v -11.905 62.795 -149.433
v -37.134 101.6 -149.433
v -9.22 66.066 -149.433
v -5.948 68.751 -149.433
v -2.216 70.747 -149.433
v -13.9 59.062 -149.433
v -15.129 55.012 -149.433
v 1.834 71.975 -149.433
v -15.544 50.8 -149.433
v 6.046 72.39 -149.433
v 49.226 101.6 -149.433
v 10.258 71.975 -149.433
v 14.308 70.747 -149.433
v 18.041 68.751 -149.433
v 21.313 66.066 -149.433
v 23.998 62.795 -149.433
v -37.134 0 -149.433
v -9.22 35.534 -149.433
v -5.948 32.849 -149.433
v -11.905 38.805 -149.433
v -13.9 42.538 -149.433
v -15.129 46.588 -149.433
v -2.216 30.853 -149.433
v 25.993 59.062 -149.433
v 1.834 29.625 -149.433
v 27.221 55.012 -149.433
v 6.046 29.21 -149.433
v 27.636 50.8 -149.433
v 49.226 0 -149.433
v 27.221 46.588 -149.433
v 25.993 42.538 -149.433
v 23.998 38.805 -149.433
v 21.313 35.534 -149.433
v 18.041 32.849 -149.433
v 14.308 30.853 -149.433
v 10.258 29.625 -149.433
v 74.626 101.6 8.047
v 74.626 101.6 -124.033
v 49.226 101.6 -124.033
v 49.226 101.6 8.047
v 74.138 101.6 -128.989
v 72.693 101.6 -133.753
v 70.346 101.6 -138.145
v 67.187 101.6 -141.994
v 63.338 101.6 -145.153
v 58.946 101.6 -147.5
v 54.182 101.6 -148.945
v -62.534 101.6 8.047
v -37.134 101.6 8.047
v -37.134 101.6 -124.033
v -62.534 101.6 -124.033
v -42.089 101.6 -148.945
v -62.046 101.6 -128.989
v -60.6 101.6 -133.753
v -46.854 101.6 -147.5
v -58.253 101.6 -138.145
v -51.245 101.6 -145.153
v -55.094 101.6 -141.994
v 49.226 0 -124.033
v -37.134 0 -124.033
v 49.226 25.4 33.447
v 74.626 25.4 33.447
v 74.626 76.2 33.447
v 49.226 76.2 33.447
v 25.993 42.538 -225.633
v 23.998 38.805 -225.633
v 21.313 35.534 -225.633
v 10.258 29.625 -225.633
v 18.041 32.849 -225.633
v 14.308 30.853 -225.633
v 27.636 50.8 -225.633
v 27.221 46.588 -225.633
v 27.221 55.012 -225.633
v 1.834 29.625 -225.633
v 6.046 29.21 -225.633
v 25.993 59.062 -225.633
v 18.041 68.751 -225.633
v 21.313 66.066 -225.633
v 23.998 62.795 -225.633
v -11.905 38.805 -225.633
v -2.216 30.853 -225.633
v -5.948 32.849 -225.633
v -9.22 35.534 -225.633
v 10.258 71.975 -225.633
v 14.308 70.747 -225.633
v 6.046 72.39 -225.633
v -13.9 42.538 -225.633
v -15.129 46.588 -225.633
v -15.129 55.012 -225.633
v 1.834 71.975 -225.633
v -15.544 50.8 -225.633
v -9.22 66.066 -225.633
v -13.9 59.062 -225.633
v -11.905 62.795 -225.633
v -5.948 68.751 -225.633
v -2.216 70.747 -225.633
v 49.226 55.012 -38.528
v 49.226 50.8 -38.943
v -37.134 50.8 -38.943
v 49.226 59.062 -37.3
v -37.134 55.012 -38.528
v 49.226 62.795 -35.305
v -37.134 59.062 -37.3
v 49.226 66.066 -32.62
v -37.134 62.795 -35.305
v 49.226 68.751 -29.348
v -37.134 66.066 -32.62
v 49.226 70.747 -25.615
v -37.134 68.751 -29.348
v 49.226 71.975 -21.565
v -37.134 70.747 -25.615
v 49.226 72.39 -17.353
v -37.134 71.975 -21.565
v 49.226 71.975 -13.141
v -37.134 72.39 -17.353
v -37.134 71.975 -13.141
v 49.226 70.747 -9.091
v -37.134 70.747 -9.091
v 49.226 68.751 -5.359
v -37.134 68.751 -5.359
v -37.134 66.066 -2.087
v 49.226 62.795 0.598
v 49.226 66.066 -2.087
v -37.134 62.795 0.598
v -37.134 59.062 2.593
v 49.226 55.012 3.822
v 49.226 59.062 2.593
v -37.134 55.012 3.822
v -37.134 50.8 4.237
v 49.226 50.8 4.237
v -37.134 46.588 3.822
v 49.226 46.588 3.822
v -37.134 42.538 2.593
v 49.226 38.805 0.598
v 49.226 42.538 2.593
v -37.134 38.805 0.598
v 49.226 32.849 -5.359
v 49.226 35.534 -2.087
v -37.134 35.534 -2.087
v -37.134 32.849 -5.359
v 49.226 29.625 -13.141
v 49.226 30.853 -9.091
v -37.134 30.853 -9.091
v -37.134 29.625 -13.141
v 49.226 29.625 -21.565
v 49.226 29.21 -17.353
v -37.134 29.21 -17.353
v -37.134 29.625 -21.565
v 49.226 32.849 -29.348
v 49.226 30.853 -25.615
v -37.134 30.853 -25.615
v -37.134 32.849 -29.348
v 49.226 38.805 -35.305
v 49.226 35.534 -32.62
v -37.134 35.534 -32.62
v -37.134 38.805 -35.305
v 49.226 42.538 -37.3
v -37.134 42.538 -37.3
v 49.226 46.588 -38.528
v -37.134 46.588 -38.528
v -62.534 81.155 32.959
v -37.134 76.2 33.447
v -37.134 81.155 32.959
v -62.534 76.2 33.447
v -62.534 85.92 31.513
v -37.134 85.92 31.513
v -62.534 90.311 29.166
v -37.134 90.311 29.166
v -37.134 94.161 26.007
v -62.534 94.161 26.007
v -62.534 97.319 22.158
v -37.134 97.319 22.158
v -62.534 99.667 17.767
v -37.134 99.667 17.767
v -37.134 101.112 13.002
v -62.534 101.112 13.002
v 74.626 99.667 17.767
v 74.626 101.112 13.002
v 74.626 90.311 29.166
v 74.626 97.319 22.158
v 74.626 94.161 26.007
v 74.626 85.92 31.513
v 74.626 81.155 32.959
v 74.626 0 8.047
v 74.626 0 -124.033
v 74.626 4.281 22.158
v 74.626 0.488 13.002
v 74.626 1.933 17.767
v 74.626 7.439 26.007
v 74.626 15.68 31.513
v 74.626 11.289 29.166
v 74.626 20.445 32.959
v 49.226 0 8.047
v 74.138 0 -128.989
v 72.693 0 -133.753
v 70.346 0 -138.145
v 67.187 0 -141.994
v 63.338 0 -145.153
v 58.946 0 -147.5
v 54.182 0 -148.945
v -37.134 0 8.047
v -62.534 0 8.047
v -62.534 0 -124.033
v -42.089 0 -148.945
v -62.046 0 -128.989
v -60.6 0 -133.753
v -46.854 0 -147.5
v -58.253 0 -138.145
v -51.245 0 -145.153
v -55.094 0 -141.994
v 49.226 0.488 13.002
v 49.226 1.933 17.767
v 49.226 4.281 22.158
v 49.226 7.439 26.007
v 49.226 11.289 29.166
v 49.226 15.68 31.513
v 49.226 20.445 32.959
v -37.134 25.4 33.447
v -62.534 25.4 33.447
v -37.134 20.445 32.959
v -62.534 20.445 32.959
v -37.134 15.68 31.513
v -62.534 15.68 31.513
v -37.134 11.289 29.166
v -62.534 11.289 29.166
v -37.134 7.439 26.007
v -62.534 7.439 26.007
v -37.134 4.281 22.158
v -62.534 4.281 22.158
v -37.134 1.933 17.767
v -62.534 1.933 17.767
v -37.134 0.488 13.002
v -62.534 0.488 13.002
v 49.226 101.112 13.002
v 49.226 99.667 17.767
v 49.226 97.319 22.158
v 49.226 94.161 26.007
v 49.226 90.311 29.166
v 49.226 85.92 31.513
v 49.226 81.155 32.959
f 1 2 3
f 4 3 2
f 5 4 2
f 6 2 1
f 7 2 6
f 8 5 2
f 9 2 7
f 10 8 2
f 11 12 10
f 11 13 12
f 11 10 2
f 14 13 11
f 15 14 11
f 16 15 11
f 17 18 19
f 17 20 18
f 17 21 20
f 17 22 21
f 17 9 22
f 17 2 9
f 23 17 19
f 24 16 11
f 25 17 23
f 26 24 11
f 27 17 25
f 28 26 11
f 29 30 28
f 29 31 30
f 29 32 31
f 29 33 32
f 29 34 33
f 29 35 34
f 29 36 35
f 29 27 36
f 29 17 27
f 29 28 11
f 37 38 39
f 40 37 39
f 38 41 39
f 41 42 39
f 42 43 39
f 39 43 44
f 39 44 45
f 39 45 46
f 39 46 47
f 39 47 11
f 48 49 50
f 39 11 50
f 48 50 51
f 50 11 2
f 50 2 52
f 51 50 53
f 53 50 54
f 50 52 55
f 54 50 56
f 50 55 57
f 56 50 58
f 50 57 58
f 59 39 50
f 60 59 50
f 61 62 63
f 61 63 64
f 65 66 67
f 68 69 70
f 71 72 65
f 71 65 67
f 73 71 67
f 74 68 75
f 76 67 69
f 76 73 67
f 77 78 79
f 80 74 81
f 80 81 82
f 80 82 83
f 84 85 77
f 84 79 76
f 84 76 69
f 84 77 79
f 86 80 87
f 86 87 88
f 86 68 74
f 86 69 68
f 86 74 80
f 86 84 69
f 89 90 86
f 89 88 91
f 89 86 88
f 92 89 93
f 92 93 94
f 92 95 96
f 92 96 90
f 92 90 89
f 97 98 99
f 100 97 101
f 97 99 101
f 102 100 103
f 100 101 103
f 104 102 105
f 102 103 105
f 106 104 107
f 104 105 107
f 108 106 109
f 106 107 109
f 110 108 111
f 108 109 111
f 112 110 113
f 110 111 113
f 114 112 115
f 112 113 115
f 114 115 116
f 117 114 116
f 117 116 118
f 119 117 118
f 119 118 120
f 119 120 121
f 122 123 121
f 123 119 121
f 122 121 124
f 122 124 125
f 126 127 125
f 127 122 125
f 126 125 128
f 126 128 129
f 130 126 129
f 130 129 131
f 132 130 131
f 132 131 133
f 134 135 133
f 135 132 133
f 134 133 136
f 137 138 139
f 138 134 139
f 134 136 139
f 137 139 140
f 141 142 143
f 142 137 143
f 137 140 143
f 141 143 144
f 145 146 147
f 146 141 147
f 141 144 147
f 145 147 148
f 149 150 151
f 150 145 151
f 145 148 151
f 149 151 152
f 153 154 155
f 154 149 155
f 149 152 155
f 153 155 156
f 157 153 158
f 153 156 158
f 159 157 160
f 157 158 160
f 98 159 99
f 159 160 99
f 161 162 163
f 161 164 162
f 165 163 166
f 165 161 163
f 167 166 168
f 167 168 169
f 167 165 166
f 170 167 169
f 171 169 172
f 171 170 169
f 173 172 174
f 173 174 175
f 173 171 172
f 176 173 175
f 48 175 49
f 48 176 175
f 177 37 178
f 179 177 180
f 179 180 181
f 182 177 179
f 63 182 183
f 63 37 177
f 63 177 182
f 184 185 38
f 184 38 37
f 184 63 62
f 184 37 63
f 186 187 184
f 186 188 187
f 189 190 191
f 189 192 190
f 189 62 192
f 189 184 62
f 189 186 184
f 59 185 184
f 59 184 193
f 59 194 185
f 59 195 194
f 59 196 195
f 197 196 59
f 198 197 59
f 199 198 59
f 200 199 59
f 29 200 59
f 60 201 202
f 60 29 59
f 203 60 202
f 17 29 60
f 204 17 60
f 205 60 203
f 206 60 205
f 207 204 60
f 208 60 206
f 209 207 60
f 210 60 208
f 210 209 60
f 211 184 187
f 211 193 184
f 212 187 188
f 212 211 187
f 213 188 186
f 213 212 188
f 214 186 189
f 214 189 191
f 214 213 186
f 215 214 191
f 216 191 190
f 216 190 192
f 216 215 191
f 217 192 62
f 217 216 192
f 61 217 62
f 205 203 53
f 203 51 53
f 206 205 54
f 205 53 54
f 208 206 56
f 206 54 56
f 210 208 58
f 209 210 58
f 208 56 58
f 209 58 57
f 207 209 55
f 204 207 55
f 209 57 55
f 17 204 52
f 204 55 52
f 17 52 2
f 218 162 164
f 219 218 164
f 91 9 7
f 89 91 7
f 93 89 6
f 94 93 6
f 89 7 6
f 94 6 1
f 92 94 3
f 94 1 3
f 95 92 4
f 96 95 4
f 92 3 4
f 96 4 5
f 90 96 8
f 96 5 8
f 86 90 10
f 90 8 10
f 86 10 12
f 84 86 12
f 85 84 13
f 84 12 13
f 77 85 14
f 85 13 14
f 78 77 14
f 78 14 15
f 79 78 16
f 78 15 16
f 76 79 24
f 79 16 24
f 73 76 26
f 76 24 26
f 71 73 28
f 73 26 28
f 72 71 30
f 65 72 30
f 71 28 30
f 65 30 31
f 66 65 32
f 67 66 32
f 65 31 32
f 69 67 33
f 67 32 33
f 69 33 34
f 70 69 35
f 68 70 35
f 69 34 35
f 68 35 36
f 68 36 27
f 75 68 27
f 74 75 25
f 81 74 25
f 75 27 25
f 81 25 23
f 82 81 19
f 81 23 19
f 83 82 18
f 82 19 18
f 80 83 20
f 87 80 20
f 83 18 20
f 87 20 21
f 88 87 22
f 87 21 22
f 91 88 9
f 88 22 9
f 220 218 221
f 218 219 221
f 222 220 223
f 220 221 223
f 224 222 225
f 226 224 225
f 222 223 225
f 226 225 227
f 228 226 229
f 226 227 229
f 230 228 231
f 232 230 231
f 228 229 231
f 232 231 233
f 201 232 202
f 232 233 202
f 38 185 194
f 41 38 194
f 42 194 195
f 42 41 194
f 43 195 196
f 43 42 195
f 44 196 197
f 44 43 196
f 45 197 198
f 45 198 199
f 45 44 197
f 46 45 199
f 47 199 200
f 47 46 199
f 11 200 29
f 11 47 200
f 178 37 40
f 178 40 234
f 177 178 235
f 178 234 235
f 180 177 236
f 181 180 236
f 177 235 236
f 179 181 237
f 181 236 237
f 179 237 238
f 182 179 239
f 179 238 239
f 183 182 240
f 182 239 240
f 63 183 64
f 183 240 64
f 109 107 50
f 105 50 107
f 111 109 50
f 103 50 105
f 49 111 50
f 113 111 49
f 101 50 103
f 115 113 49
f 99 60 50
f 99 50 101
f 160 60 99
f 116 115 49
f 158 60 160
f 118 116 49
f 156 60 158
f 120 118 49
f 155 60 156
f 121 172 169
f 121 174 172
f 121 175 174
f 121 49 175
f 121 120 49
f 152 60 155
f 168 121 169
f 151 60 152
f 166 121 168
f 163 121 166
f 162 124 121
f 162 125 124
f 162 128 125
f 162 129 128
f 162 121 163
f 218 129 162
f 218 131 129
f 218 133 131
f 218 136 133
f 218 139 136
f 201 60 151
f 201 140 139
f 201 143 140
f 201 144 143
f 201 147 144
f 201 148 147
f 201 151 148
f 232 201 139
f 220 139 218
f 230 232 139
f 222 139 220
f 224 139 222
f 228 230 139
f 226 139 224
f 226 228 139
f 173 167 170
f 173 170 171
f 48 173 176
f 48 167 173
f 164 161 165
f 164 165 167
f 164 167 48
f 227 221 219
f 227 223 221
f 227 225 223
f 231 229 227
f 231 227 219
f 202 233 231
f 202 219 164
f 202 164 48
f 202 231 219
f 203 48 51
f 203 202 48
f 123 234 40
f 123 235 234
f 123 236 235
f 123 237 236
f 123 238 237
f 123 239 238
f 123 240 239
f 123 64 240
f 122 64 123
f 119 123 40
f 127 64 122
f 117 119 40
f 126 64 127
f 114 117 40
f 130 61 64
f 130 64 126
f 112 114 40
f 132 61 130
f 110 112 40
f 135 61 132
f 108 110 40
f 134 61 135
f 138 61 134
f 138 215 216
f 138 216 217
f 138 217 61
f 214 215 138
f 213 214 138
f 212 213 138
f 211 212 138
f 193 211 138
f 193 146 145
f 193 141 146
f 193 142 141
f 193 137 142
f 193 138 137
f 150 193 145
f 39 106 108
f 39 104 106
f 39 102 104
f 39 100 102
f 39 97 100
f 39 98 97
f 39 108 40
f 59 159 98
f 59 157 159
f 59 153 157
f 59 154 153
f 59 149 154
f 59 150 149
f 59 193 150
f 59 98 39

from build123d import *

# Parameters (mm, degrees)
BOSS_EXTRUDE1_DEPTH = 101.6
BOSS_EXTRUDE2_REACH = 113.76
SKETCH3_R           = 21.59
SKETCH4_R           = 21.59
BOSS_EXTRUDE3_DEPTH = 76.2
FILLET1_R           = 25.4
FILLET2_R           = 25.4
FILLET4_R           = 25.4
FILLET5_R           = 25.4


with BuildPart() as part:
    # Sketch1 → Boss-Extrude1 (new body)
    with BuildSketch(Plane(origin=(0, 0, 0), x_dir=(1, 0, 0), z_dir=(0, 1, 0))):
        Polygon((-37.133661193, -33.44672), (-62.533661193, -33.44672), (-62.533661193, 149.43328), (74.626338807, 149.43328), (74.626338807, -33.44672), (49.226338807, -33.44672), (49.226338807, 124.03328), (-37.133661193, 124.03328), align=None)
    extrude(amount=BOSS_EXTRUDE1_DEPTH)

    # Sketch3 → Boss-Extrude2 (add, up to next)
    with BuildSketch(Plane(origin=(-37.133661193, 0, 0), x_dir=(0, 0, -1), z_dir=(1, 0, 0)), mode=Mode.PRIVATE) as boss_extrude2_sk1:
        with Locations((17.35328, 50.8)):
            Circle(SKETCH3_R)
    boss_extrude2_tool1 = extrude(boss_extrude2_sk1.sketch, amount=BOSS_EXTRUDE2_REACH, mode=Mode.PRIVATE) - part.part
    add(boss_extrude2_tool1.solids().sort_by_distance((-37.133661, 50.8, -17.35328))[0])

    # Sketch4 → Boss-Extrude3 (add)
    with BuildSketch(Plane(origin=(0, 0, -149.43328), x_dir=(-1, 0, 0), z_dir=(0, 0, -1))):
        with Locations((-6.046338807, 50.8)):
            Circle(SKETCH4_R)
    extrude(amount=BOSS_EXTRUDE3_DEPTH)

    # Fillet1
    fillet1_edges = [part.edges().sort_by_distance(p)[0] for p in [
        (-49.833661193, 101.6, 33.44672),
        (-49.833661193, 0, 33.44672),
    ]]
    fillet(fillet1_edges, radius=FILLET1_R)

    # Fillet2
    fillet2_edges = [part.edges().sort_by_distance(p)[0] for p in [
        (-62.533661193, 50.8, -149.43328),
    ]]
    fillet(fillet2_edges, radius=FILLET2_R)

    # Fillet4
    fillet4_edges = [part.edges().sort_by_distance(p)[0] for p in [
        (61.926338807, 0, 33.44672),
        (61.926338807, 101.6, 33.44672),
    ]]
    fillet(fillet4_edges, radius=FILLET4_R)

    # Fillet5
    fillet5_edges = [part.edges().sort_by_distance(p)[0] for p in [
        (74.626338807, 50.8, -149.43328),
    ]]
    fillet(fillet5_edges, radius=FILLET5_R)


solid = part.part
